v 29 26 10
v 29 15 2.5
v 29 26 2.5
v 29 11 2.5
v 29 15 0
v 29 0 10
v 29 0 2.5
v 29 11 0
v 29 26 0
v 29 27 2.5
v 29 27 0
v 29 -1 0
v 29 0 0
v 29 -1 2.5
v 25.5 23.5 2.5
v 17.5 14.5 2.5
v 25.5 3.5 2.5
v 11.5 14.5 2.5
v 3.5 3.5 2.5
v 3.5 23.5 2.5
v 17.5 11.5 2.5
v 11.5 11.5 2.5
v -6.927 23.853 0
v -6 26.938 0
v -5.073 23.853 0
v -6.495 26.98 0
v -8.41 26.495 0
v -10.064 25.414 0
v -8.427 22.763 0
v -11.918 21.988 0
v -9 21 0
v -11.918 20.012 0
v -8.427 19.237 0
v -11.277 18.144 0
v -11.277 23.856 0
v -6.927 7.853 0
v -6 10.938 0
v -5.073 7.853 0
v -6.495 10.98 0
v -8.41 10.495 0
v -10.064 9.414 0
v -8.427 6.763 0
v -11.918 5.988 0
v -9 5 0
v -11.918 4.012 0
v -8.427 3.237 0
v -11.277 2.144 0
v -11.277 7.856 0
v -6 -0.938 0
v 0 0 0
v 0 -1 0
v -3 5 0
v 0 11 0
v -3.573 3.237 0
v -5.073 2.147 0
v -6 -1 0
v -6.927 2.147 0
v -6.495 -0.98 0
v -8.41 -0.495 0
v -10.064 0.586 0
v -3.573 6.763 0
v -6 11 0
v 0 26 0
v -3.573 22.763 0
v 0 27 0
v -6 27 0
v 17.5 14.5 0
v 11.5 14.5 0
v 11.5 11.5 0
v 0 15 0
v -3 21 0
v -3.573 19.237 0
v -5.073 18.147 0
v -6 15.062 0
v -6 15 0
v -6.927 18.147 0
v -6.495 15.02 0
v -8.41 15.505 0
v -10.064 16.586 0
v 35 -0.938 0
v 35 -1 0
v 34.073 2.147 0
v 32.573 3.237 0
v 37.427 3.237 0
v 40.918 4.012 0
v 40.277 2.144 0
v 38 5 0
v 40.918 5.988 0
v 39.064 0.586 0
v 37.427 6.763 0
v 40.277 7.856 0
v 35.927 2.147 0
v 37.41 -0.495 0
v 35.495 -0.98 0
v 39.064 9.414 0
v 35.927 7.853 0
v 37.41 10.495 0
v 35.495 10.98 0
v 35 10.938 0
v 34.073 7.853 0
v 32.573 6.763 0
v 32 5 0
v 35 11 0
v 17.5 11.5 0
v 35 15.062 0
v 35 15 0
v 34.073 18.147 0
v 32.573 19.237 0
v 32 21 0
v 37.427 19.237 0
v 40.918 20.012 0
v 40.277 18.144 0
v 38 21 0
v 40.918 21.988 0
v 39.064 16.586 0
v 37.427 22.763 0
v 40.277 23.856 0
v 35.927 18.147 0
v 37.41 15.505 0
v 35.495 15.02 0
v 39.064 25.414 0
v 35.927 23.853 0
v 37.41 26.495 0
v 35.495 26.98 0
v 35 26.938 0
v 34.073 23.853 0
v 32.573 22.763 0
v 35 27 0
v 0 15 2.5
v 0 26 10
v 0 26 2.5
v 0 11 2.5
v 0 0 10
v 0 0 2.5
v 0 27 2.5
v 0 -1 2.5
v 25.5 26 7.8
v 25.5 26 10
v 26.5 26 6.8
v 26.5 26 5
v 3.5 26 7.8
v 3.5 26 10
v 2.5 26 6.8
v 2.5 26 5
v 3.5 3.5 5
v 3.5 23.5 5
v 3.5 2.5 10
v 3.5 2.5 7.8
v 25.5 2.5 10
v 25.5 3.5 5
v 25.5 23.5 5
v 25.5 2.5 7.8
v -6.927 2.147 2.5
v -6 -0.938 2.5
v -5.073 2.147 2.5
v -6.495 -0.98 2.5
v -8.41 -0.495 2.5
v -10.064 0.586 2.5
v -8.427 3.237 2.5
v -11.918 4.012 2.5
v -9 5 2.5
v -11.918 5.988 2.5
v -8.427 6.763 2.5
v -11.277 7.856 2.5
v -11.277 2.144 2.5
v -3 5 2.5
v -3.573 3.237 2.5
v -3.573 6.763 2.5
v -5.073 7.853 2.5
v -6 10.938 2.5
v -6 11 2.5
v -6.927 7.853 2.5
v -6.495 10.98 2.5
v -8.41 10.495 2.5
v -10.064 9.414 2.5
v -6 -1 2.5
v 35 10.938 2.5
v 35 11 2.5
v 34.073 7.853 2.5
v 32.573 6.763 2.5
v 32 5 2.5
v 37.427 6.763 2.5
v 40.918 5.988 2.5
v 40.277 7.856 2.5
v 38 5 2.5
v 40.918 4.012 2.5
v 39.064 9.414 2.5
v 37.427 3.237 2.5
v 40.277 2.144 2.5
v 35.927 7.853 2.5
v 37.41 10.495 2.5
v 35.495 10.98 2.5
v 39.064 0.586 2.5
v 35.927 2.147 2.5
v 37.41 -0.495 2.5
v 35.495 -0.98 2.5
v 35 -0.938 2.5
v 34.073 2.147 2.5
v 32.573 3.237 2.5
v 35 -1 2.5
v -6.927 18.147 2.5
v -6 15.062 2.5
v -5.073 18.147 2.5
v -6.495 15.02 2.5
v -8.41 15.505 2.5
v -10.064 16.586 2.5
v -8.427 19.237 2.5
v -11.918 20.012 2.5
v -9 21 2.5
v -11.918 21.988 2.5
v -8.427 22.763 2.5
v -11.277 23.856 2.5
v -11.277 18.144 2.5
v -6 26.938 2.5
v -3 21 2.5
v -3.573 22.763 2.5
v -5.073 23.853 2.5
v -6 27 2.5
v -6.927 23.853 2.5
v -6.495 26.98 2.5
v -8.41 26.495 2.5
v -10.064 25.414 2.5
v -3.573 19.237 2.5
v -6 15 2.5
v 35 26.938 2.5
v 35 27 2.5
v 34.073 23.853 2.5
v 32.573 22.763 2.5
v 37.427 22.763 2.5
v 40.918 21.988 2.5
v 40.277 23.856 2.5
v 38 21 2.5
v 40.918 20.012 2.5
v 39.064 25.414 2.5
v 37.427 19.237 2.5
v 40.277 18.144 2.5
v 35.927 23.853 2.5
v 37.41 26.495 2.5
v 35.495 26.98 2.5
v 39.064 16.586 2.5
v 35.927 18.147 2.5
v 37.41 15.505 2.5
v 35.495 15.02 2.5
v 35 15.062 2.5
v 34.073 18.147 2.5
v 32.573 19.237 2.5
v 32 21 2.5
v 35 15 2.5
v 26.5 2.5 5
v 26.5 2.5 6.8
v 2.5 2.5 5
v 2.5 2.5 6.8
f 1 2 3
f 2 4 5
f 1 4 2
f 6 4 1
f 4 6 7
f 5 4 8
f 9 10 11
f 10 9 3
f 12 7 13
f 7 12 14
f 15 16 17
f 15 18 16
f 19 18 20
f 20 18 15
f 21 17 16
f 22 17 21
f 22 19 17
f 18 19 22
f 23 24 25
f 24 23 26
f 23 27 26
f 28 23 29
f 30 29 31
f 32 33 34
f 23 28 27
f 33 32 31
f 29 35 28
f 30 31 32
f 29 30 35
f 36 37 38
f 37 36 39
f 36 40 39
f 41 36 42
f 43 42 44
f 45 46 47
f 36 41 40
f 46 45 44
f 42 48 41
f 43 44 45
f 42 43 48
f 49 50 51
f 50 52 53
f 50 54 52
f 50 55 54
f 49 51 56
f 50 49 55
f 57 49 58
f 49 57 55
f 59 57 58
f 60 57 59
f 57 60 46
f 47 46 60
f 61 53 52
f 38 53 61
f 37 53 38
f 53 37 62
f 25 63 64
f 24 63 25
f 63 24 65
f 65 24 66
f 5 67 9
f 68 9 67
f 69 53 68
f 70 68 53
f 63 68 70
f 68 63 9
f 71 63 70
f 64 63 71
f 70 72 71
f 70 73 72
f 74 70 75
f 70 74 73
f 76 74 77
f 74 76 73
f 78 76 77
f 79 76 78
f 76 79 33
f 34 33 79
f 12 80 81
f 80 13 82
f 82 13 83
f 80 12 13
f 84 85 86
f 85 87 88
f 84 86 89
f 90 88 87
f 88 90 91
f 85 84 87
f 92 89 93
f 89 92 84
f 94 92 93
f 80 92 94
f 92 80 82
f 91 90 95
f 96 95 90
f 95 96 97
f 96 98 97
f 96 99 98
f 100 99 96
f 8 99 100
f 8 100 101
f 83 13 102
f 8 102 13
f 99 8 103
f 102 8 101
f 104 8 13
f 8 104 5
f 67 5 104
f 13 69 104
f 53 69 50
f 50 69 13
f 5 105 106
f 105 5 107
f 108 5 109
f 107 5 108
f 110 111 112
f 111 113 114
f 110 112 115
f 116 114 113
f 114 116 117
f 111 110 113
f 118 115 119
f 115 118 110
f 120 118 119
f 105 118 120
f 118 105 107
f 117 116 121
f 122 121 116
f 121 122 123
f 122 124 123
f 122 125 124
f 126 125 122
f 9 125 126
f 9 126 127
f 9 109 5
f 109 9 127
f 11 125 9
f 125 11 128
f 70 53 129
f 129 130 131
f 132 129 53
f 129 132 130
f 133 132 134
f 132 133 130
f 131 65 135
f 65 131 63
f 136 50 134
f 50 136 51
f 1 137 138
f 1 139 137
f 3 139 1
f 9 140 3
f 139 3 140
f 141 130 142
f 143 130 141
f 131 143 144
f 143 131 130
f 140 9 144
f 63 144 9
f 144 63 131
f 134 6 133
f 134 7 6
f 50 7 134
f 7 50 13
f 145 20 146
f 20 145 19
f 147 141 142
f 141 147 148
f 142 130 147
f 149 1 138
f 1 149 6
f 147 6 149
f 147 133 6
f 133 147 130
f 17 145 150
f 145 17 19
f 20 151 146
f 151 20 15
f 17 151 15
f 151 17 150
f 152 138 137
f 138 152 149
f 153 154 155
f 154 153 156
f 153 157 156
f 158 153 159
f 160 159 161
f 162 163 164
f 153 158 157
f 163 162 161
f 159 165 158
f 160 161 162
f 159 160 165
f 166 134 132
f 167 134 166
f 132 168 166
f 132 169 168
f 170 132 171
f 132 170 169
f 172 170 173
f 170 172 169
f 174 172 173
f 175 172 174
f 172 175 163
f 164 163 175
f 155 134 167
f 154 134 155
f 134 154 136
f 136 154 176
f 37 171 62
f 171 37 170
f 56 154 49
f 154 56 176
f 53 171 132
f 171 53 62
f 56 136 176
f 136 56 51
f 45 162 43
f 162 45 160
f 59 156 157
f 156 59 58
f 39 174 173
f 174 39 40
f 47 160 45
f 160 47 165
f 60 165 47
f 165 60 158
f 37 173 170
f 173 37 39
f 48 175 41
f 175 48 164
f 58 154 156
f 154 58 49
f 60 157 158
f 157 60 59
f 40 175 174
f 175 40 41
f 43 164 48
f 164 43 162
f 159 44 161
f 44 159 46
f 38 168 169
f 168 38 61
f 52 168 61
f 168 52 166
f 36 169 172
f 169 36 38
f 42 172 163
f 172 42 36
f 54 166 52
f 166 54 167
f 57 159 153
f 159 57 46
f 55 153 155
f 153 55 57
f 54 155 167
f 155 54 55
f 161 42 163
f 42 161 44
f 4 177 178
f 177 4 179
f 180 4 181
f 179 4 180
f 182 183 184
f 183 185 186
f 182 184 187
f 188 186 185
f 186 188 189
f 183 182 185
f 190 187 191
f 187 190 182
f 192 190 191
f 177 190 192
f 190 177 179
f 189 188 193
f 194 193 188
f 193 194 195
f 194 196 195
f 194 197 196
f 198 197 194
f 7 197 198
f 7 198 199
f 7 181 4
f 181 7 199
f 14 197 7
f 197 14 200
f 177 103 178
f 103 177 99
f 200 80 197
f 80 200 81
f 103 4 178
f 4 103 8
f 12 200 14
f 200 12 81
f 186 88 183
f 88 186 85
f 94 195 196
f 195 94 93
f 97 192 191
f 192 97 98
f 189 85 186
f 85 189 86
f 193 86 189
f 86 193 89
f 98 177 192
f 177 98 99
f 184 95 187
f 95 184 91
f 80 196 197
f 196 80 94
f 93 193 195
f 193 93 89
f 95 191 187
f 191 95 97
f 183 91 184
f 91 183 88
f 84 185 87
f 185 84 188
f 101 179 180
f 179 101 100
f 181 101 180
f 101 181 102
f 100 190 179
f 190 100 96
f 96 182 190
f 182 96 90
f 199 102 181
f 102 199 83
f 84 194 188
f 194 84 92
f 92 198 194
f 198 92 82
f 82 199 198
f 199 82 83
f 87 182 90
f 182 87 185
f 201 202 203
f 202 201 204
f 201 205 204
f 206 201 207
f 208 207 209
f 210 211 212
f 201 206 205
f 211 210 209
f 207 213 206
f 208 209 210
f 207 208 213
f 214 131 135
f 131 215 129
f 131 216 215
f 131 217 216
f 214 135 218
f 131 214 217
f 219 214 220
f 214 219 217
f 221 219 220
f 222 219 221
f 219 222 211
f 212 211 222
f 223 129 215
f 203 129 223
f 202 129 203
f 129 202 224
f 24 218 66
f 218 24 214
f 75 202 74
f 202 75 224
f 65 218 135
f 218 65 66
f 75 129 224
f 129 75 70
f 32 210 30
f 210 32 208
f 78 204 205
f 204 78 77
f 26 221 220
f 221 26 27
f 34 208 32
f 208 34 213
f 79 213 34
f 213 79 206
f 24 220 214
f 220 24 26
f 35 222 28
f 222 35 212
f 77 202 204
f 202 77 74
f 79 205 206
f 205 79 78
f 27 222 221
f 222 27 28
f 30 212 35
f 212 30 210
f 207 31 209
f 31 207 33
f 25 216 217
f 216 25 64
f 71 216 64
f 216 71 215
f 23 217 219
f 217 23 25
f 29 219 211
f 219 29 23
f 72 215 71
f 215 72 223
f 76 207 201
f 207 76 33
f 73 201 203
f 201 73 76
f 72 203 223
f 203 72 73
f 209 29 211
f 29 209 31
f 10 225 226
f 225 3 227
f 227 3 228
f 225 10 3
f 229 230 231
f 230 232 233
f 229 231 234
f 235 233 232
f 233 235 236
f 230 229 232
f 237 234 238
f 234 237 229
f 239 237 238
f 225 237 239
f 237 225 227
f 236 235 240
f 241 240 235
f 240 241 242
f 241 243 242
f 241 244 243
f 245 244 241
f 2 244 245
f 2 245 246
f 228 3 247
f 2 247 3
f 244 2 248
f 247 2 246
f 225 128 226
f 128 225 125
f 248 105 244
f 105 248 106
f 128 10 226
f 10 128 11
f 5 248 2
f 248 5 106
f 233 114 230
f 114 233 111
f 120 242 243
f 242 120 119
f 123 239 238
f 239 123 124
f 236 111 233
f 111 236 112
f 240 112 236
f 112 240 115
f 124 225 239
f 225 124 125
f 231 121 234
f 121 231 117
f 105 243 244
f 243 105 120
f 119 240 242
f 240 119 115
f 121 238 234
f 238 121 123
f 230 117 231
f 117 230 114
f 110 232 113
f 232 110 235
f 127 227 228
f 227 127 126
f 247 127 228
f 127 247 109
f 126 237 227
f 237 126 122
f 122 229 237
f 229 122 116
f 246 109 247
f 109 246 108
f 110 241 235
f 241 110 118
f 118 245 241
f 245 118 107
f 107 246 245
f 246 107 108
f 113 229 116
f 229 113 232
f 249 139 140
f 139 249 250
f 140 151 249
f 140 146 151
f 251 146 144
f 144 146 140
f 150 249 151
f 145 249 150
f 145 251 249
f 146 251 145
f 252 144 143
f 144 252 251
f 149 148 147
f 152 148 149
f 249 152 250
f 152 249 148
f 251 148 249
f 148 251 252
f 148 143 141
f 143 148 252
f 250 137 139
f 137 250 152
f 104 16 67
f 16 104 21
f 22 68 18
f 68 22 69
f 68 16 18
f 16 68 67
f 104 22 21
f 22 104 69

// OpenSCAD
/* pcb_box_slide_with_tabs.scad
 * By Nicholas C Lewis - Jan 1, 2011
 * http://www.thingiverse.com/thing:5396 
 *
 * derived from pcb_box_slide.scad 
 *     Parametric, open PCB-box (slide-in) by chlunde
 *     http://www.thingiverse.com/thing:4071
 *
 * CHANGES
 * - adjusted to fit Arduino Mega
 * - added mounting tabs
 * - turned off cutouts
 * - adjusted bottom cutout size
 */

//Uno is 2.7" x 2.1" which is 68.58 mm x 53.34 mm
//Round up to 69 mm x 54 mm

// SD card holder is: 23,67 mm x 42,17 mm x 1,3 mm
// RTC clock is: 23,2 mm x 20,54 mm x 1,75 mm
pcb_width = 24;
pcb_length = 21;
pcb_height = 1.8;
slisse = 1;

pcb_bottom_margin = 2.5;
wall_width_thick = 3.5;
wall_width = wall_width_thick-slisse;
box_height = 10;

//tab parameters
tab_hole_radius=3;
tab_outer_radius=6;


module tab() {
	difference(){
		union() {
			translate([-tab_outer_radius,-tab_outer_radius,0])
			cube([tab_outer_radius,2*tab_outer_radius,wall_width]);
			translate([-tab_outer_radius,0,0])
				cylinder(r=tab_outer_radius, h = wall_width);
		}
		translate([-tab_outer_radius,0,0])
		cylinder(r= tab_hole_radius, h = wall_width+3,center=true);
	}

}

module box() {
  union() {
    cube([pcb_width + 2*wall_width, pcb_length + 2*wall_width, wall_width]);

    cube([wall_width_thick, pcb_length + 2*wall_width, box_height]);

    cube([pcb_width + 2*wall_width, wall_width_thick, box_height]);

    translate([0, pcb_length+wall_width, 0])
      cube([pcb_width + 2*wall_width,wall_width,box_height]);

    translate([pcb_width + wall_width - slisse,0,0])
      cube([wall_width_thick, pcb_length + 2*wall_width, box_height]);
  }

//comment out this part to remove tabs
 //for(i=[5,(pcb_length + 2*wall_width)/2,pcb_length + 2*wall_width-5]){
for(i=[5,pcb_length + 2*wall_width-5]){
	translate([0,i,0])tab();
	translate([pcb_width + 2*wall_width,i,0])mirror()tab();
 }

}

module pcb() {
  translate([wall_width, wall_width, wall_width + pcb_bottom_margin])
    cube([pcb_width,pcb_length + wall_width + 0.1,pcb_height]);
  translate([wall_width, wall_width, wall_width + pcb_bottom_margin+pcb_height])rotate([0,45,0])
    cube([pcb_height,pcb_length + wall_width + 0.1,pcb_height]);
  translate([wall_width+pcb_width-2*cos(45)*pcb_height, wall_width, wall_width + pcb_bottom_margin+pcb_height])rotate([0,45,0])
    cube([pcb_height,pcb_length + wall_width + 0.1,pcb_height]);
  translate([wall_width_thick, wall_width, wall_width + pcb_bottom_margin])
    cube([pcb_width-2*slisse,pcb_length + wall_width + 0.1,box_height]);

}



module holes() {
  *translate([wall_width + pcb_width/2, wall_width_thick + 0.1, pcb_width/2+wall_width])
    rotate(a=90,v=[1,0,0])
      cylinder(r=pcb_width/2, h=wall_width_thick + 0.2);

  *translate([-0.1, wall_width + pcb_length/2, pcb_length/2 + wall_width])
    rotate(a=90,v=[0,1,0])
      cylinder(r=pcb_length/2, h=wall_width_thick + 0.2);

  *translate([pcb_width + wall_width - slisse - 0.1, wall_width + pcb_length/2, pcb_length/2 + wall_width])
    rotate(a=90,v=[0,1,0])
      cylinder(r=pcb_length/2, h=wall_width_thick + 0.2);

 * translate([pcb_width/2 + wall_width, wall_width + pcb_length/2, -0.1])
    rotate(a=0,v=[0,1,0])
      cylinder(r=min(pcb_length,pcb_width)/2 - wall_width/2, h=wall_width_thick + 0.2);
   
  inner_margin = 9;
  translate([inner_margin +wall_width, inner_margin+wall_width, -0.1])
    cube([pcb_width-inner_margin*2,pcb_length -inner_margin*2,wall_width + 0.2]);
}

difference() {
  box();
  pcb();
  holes();
}
